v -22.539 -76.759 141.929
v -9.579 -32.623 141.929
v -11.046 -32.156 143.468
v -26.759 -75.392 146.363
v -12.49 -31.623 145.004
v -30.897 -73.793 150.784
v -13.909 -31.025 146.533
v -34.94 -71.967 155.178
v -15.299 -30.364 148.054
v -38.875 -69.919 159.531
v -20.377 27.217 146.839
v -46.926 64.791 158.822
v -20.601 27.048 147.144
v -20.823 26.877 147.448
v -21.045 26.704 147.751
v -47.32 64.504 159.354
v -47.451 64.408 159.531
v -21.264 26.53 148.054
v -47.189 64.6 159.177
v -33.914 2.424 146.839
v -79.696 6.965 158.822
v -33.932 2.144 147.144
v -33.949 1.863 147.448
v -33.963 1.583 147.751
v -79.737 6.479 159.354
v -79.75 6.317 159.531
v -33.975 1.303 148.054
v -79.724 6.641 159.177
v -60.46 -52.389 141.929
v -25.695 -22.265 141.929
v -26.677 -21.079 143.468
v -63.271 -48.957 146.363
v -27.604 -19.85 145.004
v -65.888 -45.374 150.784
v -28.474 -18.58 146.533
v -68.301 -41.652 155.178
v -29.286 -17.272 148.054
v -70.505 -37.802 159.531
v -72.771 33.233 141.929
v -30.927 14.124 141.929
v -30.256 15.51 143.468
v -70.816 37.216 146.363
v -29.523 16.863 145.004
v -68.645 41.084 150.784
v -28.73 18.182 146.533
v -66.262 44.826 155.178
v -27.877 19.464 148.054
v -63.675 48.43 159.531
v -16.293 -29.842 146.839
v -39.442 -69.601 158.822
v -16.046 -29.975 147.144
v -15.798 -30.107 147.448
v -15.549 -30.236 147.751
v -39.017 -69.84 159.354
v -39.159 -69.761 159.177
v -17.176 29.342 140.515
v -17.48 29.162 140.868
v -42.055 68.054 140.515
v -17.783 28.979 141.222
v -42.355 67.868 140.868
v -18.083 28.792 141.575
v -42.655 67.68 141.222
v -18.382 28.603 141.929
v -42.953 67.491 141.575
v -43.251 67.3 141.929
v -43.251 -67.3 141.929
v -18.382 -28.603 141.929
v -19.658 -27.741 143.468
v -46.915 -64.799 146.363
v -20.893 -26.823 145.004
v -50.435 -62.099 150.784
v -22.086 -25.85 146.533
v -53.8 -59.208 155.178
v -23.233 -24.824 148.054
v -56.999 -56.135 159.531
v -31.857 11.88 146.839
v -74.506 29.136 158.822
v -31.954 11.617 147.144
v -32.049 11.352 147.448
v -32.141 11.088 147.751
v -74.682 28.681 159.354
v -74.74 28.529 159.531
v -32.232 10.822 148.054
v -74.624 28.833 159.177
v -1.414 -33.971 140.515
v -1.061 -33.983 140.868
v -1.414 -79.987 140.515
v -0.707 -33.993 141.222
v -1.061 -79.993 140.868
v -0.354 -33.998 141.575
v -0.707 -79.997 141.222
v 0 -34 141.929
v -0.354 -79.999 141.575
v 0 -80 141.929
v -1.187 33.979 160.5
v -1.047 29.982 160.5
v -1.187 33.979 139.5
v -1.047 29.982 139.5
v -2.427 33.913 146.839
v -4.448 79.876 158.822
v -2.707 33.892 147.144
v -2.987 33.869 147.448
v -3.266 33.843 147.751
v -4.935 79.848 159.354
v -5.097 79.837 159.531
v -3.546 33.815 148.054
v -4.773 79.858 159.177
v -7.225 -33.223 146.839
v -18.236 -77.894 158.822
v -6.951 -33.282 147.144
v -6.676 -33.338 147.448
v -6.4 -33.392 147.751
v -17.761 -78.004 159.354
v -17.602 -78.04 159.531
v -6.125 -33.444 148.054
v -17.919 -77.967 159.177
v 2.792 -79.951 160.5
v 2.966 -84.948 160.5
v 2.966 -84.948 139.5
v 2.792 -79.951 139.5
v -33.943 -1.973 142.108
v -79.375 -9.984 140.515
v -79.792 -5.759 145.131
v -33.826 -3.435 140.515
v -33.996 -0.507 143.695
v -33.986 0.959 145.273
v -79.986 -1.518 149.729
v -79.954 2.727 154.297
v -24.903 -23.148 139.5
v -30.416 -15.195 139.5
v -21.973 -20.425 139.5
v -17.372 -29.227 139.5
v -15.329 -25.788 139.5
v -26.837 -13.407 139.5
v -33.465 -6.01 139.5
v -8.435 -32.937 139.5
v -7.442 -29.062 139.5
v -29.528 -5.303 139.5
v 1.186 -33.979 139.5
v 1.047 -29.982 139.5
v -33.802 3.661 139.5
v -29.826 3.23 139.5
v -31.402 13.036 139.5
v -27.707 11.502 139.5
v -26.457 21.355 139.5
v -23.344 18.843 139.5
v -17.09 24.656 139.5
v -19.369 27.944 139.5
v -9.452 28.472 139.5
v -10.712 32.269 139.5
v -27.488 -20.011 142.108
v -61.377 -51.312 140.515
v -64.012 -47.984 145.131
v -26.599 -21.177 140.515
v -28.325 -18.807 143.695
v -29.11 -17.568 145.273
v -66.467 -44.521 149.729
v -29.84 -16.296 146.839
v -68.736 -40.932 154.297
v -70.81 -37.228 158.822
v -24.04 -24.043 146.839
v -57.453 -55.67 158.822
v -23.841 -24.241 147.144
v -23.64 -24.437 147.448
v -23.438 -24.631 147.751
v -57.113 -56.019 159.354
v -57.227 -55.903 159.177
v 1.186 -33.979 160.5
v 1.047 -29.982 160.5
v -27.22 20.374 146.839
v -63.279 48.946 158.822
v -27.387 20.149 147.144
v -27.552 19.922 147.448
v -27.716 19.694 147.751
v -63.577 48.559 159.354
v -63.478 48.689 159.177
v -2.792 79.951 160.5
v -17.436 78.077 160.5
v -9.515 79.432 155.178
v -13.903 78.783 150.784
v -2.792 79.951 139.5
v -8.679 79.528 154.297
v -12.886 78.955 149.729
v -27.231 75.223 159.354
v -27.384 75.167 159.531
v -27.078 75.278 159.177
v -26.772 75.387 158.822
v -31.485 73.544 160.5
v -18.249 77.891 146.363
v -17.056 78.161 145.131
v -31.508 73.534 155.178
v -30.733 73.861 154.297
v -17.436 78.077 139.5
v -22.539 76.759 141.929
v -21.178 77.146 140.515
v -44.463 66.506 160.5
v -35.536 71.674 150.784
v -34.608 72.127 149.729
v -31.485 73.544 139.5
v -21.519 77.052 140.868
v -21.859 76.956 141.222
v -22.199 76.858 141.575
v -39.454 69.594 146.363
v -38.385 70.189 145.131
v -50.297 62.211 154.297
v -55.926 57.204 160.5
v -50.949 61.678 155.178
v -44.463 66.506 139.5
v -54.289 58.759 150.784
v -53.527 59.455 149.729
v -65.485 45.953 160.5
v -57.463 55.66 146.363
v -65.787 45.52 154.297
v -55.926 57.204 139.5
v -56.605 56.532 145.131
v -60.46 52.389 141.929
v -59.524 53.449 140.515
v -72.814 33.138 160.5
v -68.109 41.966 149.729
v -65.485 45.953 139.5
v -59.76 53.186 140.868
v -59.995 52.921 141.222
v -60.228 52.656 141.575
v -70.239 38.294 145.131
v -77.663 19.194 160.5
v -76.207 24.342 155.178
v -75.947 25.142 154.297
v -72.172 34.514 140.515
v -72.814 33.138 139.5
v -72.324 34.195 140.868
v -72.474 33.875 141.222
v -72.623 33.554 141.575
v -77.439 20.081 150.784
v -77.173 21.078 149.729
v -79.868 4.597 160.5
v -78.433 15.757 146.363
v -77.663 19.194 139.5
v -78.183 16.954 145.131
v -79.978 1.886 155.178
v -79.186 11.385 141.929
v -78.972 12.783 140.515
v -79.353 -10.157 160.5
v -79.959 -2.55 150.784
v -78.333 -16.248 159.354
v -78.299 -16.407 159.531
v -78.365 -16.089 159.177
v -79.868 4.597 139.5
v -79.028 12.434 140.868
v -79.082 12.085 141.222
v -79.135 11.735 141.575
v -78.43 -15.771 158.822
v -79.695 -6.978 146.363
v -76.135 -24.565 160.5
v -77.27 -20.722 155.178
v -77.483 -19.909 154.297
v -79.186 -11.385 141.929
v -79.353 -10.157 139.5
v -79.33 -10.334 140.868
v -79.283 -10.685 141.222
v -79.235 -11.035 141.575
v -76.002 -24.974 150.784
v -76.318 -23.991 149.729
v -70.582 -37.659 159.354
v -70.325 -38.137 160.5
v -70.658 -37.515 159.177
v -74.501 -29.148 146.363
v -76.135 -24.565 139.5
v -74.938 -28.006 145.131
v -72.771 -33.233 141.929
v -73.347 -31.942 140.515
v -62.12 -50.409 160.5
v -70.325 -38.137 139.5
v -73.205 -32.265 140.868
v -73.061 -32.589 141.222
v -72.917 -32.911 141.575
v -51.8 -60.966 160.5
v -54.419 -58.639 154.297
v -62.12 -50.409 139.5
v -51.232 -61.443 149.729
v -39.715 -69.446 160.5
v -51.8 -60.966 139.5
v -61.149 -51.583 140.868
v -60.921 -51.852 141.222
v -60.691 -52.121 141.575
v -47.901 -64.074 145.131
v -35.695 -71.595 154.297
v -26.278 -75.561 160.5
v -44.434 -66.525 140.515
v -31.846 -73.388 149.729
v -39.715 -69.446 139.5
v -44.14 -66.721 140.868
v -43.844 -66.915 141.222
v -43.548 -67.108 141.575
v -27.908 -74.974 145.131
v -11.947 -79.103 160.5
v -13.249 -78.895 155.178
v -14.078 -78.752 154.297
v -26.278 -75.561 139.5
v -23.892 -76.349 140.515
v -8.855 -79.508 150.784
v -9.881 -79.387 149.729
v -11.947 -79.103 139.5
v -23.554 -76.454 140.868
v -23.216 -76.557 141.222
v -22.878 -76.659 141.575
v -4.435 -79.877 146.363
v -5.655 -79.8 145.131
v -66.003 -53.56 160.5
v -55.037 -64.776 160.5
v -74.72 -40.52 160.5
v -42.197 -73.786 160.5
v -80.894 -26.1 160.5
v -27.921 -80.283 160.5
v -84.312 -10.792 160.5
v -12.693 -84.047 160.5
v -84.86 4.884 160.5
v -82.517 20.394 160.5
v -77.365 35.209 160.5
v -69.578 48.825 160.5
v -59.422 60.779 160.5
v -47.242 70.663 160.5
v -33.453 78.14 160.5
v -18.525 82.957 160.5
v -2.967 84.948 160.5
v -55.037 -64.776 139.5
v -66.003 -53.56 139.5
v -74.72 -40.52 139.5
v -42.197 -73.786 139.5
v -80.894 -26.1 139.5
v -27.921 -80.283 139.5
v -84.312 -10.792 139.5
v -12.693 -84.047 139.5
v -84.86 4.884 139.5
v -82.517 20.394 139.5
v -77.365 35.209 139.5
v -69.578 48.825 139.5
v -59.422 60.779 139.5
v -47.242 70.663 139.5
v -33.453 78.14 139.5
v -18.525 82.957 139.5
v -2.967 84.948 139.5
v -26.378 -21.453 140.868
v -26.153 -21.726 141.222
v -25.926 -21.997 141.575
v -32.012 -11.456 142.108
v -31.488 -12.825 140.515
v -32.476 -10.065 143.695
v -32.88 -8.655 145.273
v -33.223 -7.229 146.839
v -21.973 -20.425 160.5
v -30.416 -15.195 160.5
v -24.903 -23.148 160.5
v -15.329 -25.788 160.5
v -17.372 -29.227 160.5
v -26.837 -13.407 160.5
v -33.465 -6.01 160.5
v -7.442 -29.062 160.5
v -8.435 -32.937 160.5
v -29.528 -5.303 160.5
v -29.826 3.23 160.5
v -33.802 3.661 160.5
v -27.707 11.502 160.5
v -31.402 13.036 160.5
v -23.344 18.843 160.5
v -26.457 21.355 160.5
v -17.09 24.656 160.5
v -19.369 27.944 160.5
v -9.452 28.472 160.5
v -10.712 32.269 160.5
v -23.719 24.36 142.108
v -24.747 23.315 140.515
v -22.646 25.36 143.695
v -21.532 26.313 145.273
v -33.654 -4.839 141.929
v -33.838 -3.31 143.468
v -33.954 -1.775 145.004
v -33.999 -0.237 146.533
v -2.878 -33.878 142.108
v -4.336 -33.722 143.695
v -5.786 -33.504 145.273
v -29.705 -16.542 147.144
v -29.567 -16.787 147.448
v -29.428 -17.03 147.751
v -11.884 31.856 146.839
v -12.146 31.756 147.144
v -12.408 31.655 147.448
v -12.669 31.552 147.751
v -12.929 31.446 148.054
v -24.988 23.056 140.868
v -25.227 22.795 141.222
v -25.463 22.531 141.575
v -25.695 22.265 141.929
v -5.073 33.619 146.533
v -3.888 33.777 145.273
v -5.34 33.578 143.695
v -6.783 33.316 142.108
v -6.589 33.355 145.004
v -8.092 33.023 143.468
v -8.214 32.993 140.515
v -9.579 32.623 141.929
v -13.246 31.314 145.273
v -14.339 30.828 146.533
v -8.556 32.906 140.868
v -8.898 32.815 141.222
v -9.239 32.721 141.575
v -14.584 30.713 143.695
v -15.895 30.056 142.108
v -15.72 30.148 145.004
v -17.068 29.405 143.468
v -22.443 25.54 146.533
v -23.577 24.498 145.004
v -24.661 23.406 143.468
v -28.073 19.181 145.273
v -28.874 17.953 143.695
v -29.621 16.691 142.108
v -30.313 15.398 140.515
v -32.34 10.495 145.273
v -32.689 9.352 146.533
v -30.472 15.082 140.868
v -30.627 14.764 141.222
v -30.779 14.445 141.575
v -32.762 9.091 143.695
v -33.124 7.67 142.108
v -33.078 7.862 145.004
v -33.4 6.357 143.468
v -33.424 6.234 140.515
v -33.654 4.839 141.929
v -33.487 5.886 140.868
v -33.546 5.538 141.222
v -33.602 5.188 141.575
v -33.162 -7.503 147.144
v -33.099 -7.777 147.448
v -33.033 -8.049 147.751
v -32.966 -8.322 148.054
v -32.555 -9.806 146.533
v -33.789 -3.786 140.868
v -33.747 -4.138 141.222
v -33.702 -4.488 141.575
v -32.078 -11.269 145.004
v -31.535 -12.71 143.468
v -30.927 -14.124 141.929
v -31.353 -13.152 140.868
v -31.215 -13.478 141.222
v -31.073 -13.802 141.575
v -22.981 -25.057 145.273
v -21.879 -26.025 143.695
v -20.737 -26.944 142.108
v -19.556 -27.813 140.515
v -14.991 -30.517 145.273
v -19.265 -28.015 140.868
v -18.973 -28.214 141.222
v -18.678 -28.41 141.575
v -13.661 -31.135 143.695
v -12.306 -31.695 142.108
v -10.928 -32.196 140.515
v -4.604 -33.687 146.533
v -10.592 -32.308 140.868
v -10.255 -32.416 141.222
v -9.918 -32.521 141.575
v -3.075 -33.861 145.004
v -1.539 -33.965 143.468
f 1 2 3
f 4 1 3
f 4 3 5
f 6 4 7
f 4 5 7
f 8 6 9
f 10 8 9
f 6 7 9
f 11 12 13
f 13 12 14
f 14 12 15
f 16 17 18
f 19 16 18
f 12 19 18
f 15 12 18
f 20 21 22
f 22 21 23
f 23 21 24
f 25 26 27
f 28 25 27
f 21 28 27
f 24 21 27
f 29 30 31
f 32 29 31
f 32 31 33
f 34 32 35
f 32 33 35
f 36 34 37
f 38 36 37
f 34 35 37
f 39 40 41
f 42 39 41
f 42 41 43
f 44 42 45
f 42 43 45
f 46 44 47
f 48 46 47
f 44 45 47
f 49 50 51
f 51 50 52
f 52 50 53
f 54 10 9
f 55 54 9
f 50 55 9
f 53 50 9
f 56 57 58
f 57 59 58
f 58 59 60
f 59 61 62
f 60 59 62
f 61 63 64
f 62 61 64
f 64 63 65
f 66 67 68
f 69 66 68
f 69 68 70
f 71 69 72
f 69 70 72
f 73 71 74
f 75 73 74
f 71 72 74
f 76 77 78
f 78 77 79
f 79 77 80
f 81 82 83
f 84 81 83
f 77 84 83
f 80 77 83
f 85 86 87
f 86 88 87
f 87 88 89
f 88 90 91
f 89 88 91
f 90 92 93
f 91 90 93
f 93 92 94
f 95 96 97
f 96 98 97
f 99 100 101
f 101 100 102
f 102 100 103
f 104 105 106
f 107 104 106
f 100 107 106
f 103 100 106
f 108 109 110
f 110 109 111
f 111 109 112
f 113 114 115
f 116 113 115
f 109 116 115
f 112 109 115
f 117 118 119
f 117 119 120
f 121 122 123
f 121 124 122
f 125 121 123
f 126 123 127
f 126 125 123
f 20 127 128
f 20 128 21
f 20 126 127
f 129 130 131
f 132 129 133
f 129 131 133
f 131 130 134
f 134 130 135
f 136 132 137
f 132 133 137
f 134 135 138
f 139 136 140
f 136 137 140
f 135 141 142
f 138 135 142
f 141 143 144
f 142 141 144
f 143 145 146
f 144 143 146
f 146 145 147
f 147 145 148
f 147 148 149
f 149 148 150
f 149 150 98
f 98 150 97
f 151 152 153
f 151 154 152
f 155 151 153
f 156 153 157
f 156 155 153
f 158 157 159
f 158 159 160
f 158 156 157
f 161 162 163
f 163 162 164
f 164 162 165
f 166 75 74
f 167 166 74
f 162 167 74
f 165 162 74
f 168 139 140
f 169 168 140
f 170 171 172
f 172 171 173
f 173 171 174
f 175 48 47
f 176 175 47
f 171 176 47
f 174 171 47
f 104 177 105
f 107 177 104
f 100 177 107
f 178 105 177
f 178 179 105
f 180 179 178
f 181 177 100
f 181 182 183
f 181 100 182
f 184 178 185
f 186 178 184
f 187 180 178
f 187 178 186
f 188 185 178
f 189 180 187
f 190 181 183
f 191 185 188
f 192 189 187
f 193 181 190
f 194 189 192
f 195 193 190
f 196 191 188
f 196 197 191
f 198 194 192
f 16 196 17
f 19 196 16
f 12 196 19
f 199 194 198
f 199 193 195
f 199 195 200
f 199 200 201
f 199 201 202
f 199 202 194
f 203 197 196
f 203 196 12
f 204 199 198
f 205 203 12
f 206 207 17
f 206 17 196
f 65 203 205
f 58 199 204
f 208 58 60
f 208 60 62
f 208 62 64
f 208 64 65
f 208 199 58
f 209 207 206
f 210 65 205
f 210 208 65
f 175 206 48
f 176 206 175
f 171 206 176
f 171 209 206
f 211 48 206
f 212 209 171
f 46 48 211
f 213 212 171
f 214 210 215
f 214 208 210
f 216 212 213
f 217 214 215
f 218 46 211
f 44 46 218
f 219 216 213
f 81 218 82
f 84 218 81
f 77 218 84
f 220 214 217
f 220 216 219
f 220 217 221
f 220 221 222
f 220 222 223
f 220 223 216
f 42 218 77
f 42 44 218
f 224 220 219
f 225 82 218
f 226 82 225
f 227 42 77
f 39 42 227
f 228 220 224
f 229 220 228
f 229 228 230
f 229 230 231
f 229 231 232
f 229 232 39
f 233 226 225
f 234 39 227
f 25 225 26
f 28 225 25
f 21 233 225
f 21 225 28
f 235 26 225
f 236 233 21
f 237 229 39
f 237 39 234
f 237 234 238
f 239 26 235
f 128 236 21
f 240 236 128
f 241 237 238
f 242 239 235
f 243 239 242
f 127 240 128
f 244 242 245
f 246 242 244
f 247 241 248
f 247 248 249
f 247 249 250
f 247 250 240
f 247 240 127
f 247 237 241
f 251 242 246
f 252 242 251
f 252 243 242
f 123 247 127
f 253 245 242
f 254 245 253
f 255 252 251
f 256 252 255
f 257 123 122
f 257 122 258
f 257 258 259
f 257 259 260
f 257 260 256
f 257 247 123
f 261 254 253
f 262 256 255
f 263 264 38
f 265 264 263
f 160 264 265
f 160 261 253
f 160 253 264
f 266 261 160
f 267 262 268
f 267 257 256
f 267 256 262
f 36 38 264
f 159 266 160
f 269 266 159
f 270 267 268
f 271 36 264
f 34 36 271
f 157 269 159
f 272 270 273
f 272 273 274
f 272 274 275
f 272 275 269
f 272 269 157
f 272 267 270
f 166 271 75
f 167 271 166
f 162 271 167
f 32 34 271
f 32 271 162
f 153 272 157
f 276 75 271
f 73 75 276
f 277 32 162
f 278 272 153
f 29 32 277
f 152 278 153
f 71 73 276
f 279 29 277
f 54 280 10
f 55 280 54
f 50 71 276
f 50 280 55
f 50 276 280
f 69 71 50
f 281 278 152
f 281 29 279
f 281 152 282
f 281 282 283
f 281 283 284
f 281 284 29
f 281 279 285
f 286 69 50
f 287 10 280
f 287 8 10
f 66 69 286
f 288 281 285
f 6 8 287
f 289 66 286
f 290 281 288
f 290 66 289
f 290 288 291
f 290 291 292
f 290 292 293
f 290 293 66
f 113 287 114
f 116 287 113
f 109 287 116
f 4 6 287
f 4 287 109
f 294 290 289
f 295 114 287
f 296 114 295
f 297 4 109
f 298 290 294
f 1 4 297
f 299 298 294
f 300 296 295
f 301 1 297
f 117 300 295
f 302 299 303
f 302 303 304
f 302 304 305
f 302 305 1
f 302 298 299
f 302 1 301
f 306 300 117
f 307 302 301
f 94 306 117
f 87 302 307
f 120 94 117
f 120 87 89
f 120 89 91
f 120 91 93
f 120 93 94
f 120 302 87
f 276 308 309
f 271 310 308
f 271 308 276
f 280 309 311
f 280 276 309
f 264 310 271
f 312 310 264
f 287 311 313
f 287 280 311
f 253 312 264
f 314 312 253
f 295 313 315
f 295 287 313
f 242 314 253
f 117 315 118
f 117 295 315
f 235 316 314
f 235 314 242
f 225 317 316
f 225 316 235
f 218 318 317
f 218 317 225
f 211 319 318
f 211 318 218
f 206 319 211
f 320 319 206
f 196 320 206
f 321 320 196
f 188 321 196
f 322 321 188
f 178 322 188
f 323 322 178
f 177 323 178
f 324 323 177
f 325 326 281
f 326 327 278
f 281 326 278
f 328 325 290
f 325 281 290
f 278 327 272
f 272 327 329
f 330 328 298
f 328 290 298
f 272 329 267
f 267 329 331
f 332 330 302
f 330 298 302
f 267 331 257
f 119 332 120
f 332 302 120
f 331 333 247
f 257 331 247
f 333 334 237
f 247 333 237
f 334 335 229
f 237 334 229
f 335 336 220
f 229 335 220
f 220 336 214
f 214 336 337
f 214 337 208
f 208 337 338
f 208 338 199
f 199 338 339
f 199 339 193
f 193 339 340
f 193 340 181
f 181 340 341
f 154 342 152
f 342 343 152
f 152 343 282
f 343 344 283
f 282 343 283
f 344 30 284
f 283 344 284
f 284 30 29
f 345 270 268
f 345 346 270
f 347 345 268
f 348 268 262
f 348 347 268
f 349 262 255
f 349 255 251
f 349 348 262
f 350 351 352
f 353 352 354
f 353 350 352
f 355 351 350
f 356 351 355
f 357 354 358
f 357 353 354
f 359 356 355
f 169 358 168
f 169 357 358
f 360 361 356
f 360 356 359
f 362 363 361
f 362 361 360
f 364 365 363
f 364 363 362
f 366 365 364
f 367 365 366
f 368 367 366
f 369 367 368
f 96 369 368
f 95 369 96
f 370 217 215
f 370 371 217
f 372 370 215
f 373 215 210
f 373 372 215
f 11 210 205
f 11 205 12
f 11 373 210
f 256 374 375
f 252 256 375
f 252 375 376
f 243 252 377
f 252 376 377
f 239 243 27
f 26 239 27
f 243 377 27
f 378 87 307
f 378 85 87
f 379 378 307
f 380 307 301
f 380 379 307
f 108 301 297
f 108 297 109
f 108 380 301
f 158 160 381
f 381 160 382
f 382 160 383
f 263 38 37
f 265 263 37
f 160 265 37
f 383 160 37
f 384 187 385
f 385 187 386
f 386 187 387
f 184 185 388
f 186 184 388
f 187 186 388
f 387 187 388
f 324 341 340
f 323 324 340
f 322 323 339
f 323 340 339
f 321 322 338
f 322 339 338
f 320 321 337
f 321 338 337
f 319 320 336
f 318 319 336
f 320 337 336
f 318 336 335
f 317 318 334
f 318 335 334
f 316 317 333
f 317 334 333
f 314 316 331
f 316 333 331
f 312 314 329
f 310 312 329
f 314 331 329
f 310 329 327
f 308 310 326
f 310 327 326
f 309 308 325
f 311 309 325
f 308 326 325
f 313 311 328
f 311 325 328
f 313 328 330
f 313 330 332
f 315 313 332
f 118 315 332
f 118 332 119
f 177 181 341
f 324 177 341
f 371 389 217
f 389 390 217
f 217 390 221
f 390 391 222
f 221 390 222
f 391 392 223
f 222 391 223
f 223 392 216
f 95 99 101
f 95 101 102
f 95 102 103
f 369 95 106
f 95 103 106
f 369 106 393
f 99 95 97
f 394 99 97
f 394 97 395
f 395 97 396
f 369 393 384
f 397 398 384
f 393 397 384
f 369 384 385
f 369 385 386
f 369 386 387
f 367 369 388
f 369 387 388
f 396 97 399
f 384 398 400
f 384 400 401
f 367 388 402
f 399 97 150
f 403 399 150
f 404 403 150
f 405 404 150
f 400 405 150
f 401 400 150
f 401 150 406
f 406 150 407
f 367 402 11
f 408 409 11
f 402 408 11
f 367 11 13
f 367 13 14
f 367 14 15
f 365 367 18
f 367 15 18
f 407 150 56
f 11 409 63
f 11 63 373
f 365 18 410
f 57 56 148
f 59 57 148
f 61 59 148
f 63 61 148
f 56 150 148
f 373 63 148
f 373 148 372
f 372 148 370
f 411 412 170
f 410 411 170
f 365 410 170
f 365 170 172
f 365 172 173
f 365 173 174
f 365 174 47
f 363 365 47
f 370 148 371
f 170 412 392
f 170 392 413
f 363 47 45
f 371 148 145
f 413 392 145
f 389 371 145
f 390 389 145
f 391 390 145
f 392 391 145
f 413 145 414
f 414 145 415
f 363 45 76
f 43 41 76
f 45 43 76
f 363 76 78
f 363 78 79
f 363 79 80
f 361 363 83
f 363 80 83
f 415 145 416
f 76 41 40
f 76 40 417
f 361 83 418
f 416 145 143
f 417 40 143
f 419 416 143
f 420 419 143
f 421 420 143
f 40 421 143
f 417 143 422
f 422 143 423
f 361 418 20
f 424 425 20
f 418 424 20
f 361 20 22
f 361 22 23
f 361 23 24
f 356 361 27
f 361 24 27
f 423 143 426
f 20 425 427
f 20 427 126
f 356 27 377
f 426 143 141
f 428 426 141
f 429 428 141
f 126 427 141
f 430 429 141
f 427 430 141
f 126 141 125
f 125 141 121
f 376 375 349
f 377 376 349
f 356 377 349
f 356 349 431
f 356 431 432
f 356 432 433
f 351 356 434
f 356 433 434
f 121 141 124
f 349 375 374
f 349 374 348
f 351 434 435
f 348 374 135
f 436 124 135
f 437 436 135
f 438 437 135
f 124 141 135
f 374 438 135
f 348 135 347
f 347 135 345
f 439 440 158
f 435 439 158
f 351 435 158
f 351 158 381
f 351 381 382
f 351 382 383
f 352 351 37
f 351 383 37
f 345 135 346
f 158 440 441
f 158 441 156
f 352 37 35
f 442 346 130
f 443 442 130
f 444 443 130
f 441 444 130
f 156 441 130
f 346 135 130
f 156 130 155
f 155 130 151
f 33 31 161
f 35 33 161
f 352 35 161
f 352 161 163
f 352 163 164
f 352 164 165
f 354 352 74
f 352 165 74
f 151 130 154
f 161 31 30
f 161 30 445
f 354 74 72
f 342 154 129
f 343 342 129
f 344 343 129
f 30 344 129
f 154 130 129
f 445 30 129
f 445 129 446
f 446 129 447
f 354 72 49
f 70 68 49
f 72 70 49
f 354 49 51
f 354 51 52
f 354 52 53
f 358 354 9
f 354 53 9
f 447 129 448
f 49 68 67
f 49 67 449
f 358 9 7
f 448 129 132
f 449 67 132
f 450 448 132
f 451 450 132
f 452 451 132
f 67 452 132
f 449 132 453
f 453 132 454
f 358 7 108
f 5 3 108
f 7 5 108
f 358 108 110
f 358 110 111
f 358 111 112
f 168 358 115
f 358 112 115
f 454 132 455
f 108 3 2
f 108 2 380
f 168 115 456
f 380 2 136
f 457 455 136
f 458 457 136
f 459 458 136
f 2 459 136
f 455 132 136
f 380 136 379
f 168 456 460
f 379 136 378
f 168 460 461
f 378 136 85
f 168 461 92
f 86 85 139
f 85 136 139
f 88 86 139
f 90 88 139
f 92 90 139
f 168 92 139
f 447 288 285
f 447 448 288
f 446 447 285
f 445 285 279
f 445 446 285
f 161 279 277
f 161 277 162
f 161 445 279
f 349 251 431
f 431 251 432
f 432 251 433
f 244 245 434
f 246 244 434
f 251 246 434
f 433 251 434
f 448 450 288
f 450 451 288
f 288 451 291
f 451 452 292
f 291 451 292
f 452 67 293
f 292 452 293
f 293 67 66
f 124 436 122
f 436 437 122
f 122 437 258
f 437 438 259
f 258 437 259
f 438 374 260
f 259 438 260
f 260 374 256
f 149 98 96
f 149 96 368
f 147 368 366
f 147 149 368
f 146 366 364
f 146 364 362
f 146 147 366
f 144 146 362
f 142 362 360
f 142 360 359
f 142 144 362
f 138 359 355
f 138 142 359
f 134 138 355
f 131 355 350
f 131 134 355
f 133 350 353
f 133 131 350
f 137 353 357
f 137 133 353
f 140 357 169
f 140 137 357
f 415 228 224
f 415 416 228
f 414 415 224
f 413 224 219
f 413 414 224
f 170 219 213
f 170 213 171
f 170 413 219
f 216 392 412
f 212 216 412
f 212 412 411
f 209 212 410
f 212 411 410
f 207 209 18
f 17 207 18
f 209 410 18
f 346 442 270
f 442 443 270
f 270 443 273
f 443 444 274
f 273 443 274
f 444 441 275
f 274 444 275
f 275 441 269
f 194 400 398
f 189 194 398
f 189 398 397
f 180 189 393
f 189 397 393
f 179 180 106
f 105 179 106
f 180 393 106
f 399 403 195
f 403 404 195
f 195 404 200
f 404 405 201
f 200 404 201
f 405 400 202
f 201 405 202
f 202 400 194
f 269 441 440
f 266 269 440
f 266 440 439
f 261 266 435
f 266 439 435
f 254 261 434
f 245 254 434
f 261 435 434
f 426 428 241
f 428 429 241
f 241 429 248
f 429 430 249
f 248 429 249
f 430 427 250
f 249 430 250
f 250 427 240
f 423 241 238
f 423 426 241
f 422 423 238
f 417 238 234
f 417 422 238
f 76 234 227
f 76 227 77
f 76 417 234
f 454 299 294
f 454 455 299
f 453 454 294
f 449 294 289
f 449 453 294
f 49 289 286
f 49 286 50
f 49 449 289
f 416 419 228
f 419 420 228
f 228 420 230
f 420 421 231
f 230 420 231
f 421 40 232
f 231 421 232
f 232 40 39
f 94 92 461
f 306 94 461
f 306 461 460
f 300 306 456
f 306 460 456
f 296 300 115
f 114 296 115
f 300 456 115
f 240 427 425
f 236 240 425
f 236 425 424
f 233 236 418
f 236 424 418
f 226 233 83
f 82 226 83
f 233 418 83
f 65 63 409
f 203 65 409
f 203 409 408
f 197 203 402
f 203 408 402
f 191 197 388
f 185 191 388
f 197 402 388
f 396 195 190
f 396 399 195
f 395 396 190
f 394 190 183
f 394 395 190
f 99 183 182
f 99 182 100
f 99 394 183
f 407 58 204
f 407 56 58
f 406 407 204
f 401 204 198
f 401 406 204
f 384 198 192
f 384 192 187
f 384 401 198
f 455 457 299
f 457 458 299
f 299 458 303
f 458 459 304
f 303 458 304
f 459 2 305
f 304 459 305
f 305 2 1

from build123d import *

# Parameters (mm, degrees)
BOX001_W                  = 500
BOX001_H                  = 500
BOX001_DEPTH              = 500
BOX001_PLACEMENT_ANGLE    = 2
TUBE034_R                 = 85
TUBE034_R_2               = 80
TUBE034_DEPTH             = 21
TUBE033_R                 = 100
TUBE033_R_2               = 80
TUBE033_DEPTH             = 200
PAD032_DEPTH              = 100
PAD033_DEPTH              = 2
COMMON014_PLACEMENT_ANGLE = 45
ARRAY014_COUNT            = 22
ARRAY014_PLACEMENT_ANGLE  = 180
TUBE035_R                 = 34
TUBE035_R_2               = 30
TUBE035_DEPTH             = 21


with BuildPart() as cube001:
    # Box001 → Box001 (new body)
    with BuildSketch(Plane.XY):
        with Locations((250, 250)):
            Rectangle(BOX001_W, BOX001_H)
    extrude(amount=BOX001_DEPTH)


with BuildPart() as cube001_1:
    # Box001 placement: moved
    add(cube001.part.moved(Location((8.73, -250, 0))).rotate(Axis((8.73, -250, 0), (0, 0, 1)), BOX001_PLACEMENT_ANGLE))


with BuildPart() as tube034:
    # Tube034 → Tube034 (new body)
    with BuildSketch(Plane.XY.offset(139.5)):
        Circle(TUBE034_R)
        Circle(TUBE034_R_2, mode=Mode.SUBTRACT)
    extrude(amount=TUBE034_DEPTH)


with BuildPart() as tube033:
    # Tube033 → Tube033 (new body)
    with BuildSketch(Plane.XY):
        Circle(TUBE033_R)
        Circle(TUBE033_R_2, mode=Mode.SUBTRACT)
    extrude(amount=TUBE033_DEPTH)


with BuildPart() as body033:
    # Sketch032 → Pad032 (new body)
    with BuildSketch(Plane.XZ):
        Polygon((0, 0), (0, 2), (26, 0.9), (26, 0), align=None)
    extrude(amount=PAD032_DEPTH)


with BuildPart() as body033_1:
    # Body033 placement: moved
    add(body033.part.moved(Location((-5, 0, 5))))


with BuildPart() as cut008:
    # Sketch033 → Pad033 (new body)
    with BuildSketch(Plane.XY):
        Polygon((0, 0), (0, -52), (25.94305, -47.924315), (8.5, 0), align=None)
    extrude(amount=PAD033_DEPTH)


with BuildPart() as cut008_1:
    # Body034 placement: moved
    add(cut008.part.moved(Location((-5, -33, 5))))

    # Common014: intersect Body033
    add(body033_1.part, mode=Mode.INTERSECT)


with BuildPart() as cut008_2:
    # Common014 placement: moved
    add(cut008_1.part.rotate(Axis((0, 0, 0), (0, 1, 0)), COMMON014_PLACEMENT_ANGLE))

    # Array014: Cut008 ×22 about axis
    array014_axis = Axis((0, 0, 0), (0, 0, 1))


with BuildPart() as cut008_3:
    add(cut008_2.part)
    for i in range(1, ARRAY014_COUNT):
        add(cut008_2.part.rotate(array014_axis, i * 360 / ARRAY014_COUNT))


with BuildPart() as cut008_4:
    # Array014 placement: moved
    add(cut008_3.part.moved(Location((0, 0, 149))).rotate(Axis((0, 0, 149), (0, 1, 0)), ARRAY014_PLACEMENT_ANGLE))

    # Cut008: cut Tube033
    add(tube033.part, mode=Mode.SUBTRACT)


with BuildPart() as statorh2:
    # Tube035 → Tube035 (new body)
    with BuildSketch(Plane.XY.offset(139.5)):
        Circle(TUBE035_R)
        Circle(TUBE035_R_2, mode=Mode.SUBTRACT)
    extrude(amount=TUBE035_DEPTH)

    # Fusion016: union Tube034, Cut008
    add(tube034.part)
    add(cut008_4.part)

    # Cut009: cut Cube001
    add(cube001_1.part, mode=Mode.SUBTRACT)


solid = statorh2.part
